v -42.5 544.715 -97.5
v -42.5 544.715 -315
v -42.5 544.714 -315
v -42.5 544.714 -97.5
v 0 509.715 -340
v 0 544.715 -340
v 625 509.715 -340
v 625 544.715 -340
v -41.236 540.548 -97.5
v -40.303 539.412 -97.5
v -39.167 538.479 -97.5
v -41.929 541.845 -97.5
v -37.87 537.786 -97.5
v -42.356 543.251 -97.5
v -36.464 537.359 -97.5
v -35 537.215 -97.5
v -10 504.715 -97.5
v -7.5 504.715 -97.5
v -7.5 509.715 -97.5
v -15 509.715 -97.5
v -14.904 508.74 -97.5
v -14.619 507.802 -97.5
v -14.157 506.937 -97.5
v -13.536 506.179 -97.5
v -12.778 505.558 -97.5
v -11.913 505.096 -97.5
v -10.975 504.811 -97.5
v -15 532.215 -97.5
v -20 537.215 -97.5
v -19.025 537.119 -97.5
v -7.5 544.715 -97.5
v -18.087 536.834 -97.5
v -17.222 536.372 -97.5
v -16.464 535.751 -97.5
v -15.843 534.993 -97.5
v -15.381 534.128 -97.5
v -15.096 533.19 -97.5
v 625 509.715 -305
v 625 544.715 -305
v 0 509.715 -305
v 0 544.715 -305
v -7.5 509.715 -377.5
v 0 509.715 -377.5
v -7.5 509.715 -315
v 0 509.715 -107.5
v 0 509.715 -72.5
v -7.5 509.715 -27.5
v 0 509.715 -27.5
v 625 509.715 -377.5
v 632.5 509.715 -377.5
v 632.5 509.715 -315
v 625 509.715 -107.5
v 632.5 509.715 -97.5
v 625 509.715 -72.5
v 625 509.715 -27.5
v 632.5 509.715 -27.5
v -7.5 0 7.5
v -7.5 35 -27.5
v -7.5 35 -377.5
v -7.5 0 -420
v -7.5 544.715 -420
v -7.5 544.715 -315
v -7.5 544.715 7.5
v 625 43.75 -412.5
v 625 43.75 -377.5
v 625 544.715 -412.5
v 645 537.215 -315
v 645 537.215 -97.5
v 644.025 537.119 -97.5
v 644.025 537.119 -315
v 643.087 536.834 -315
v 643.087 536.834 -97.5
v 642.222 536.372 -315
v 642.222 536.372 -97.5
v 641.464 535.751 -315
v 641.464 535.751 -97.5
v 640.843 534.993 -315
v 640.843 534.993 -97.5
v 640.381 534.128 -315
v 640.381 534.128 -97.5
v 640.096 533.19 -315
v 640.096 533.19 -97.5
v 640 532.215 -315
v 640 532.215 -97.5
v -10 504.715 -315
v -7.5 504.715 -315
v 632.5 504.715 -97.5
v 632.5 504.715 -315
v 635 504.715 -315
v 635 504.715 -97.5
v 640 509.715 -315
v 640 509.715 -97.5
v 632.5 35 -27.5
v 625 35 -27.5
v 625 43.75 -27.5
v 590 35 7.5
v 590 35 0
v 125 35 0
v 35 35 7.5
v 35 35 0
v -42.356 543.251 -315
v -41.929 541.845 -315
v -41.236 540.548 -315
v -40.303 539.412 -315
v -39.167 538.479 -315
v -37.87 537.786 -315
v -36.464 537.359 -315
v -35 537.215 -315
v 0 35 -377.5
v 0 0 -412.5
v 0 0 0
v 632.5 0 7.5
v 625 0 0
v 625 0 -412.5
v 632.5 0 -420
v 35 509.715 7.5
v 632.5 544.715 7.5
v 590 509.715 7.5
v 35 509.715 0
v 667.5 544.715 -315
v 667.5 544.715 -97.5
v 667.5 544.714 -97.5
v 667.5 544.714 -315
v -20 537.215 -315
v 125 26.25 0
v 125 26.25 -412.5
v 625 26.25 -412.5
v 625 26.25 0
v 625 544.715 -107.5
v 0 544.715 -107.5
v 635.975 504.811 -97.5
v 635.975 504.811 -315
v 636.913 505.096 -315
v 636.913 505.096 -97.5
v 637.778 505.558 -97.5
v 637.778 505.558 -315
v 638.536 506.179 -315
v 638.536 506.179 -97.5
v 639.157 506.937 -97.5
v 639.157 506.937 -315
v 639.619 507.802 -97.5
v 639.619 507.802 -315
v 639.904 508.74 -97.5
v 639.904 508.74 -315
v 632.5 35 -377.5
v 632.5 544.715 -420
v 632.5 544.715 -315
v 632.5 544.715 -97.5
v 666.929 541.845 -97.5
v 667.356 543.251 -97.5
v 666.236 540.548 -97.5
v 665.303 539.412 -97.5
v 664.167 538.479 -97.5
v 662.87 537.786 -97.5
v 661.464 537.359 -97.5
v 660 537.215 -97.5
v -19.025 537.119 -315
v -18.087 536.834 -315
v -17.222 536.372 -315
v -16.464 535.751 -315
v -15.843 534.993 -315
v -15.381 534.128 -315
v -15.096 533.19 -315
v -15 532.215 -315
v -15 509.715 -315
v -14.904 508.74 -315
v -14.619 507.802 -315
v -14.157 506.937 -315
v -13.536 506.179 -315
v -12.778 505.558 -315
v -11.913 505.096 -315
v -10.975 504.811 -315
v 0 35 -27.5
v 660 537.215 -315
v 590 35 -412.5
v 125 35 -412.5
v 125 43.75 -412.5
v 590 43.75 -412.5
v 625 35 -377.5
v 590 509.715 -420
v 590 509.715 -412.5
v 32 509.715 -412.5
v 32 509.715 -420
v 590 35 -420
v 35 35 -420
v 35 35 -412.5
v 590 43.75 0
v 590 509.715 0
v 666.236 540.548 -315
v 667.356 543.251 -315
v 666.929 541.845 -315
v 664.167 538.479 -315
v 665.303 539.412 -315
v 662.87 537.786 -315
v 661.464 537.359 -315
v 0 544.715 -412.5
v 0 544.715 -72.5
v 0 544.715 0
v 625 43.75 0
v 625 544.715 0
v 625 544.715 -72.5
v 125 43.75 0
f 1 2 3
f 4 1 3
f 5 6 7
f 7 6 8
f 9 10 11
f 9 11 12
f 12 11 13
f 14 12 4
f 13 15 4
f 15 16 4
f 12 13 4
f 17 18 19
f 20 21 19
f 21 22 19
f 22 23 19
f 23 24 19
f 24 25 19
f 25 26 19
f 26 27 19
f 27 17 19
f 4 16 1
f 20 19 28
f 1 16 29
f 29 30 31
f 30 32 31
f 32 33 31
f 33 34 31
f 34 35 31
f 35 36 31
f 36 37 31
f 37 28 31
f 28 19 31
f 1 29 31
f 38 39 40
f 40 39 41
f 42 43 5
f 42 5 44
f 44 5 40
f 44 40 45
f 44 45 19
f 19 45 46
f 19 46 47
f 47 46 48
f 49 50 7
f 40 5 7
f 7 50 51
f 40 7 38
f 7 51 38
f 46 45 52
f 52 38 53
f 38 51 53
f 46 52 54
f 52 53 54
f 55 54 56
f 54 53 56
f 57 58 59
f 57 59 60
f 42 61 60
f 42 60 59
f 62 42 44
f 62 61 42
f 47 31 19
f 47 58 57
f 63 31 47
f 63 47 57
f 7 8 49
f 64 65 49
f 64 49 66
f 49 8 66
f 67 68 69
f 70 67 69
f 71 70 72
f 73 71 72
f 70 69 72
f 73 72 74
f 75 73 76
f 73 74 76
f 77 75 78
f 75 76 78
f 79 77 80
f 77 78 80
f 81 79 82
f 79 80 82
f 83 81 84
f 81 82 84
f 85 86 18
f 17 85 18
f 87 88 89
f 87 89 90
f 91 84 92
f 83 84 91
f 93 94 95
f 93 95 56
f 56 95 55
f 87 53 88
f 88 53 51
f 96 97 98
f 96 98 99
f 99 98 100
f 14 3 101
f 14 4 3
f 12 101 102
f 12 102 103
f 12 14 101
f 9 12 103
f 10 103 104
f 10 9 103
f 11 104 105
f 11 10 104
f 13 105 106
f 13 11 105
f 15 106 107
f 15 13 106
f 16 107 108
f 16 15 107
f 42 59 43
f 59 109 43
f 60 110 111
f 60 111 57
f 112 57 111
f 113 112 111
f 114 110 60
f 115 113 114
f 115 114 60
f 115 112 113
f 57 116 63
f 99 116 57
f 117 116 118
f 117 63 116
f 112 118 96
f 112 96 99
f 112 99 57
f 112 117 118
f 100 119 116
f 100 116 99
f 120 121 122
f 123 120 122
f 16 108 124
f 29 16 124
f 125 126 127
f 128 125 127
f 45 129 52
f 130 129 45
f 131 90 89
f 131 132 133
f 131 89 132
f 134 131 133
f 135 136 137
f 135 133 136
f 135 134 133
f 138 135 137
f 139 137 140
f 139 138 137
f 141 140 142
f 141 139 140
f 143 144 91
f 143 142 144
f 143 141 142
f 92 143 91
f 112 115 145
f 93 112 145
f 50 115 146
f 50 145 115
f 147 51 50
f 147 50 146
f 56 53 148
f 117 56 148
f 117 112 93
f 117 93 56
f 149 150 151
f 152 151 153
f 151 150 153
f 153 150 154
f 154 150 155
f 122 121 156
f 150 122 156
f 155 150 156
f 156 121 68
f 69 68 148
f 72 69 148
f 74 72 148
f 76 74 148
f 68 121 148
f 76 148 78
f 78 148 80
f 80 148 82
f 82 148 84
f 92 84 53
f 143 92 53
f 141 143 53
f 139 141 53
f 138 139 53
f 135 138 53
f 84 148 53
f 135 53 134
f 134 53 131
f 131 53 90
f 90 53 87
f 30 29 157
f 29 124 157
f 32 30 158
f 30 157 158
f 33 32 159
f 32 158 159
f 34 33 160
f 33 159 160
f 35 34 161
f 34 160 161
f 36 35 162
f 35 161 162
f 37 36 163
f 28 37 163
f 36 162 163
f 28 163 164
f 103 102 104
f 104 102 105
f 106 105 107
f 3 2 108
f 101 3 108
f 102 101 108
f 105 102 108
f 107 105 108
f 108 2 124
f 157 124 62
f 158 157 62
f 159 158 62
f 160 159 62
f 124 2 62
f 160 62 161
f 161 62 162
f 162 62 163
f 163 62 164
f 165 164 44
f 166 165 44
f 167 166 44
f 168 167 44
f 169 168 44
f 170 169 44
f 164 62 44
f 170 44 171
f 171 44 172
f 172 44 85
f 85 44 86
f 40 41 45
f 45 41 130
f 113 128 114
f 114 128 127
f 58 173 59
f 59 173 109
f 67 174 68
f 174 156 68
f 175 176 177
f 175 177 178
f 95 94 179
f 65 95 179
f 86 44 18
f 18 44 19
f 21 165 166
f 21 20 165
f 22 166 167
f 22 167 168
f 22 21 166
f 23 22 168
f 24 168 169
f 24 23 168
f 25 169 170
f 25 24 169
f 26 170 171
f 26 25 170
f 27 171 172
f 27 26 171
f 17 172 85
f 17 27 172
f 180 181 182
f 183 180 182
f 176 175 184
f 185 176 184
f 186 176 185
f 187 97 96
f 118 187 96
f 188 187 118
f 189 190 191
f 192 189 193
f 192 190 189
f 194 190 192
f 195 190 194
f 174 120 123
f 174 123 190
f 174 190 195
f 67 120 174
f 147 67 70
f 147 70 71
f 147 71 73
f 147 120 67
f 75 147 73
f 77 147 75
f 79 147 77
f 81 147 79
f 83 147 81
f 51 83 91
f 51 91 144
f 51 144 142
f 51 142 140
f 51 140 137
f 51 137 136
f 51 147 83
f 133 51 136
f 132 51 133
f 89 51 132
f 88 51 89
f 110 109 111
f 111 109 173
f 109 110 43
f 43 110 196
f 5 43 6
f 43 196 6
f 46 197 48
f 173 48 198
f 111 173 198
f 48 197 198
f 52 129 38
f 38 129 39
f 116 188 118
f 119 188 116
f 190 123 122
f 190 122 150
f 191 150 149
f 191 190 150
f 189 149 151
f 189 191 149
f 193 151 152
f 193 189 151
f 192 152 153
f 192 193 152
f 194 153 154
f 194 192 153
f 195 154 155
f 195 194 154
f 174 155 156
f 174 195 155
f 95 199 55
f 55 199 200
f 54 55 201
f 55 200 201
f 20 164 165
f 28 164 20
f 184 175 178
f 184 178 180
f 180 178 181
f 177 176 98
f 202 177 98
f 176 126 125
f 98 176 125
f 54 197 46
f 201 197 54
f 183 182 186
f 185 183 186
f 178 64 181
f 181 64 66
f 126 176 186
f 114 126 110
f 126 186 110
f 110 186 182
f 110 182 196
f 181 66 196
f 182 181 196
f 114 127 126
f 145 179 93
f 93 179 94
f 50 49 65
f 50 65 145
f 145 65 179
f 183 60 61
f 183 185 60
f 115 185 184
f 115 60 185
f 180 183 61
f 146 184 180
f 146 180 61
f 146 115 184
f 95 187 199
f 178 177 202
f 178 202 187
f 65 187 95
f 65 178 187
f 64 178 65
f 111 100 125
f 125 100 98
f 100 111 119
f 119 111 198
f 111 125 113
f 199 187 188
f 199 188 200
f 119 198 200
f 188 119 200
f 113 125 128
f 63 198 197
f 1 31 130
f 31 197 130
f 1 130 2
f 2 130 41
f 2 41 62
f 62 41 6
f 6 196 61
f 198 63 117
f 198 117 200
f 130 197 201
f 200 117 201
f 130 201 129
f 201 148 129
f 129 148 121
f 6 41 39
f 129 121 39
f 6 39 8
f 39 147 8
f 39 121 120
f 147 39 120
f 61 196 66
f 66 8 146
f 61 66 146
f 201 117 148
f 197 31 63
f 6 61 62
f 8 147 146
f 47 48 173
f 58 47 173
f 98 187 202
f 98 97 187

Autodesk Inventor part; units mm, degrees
ref_plane "YZ Plane" through (0, 0, 0) normal (1, 0, 0) x (0, 1, 0)
ref_plane "XZ Plane" through (0, 0, 0) normal (0, 1, 0) x (-1, 0, 0)
ref_plane "XY Plane" through (0, 0, 0) normal (0, 0, 1) x (1, 0, 0)
sketch "Boceto1" plane through (0, 0, 0) normal (0, 0, 1) x (1, 0, 0)
  line L0 (0, 0) -> (0, 544.715)
  line L1 (0, 544.715) -> (35, 544.715)
  line L2 (35, 509.715) -> (35, 0)
  line L3 (35, 0) -> (0, 0)
  line L4 (35, 544.715) -> (625, 544.715)
  line L5 (625, 544.715) -> (625, 509.715)
  line L6 (625, 509.715) -> (35, 509.715)
  line L7 (625, 509.715) -> (625, 0)
  line L8 (590, 0) -> (590, 509.715)
  line L9 (590, 0) -> (625, 0)
  line L10 (590, 0) -> (625, 0)
  line L11 (590, 509.715) -> (590, 0)
  line L12 (35, 0) -> (590, 0)
  line L13 (590, 0) -> (590, 35)
  line L14 (590, 35) -> (35, 35)
  line L15 (35, 544.715) -> (35, 509.715)
  line L16 (590, 509.715) -> (590, 544.715)
  dimension "d0" = 544.715
  dimension "d1" = 35
  dimension "d2" = 590
  dimension "d3" = 35
  dimension "d4" = 35
  dimension "d5" = 35
extrude "Extrusión1" add sketch "Boceto1" along normal blind 7.5 contours L0 L1 L15 L2 L3 | L2 L14 L8 L12 | L4 L16 L6 L15 | L8 L6 L7 L9 | L4 L5 L6 L16
ref_plane "Plano de trabajo1" through (0, 0, -617.5) normal (0, 0, -1) x (-1, 0, 0)
sketch "Boceto6" plane through (625, 0, 0) normal (1, 0, 0) x (0, 0, -1)
  line L0 (0, 0) -> (-7.5, 0) projected
  line L1 (-7.5, 0) -> (412.5, 0)
  line L2 (412.5, 0) -> (412.5, 544.715)
  line L3 (-7.5, 544.715) -> (-7.5, 0) projected
  line L4 (412.5, 544.715) -> (-7.5, 544.715)
  line L5 (-7.5, 544.715) -> (-7.5, 0)
  line L6 (-7.5, 544.715) -> (-7.5, 509.715)
  line L7 (-7.5, 509.715) -> (377.5, 509.715)
  line L8 (377.5, 509.715) -> (377.5, 35)
  line L9 (377.5, 35) -> (27.5, 35)
  line L10 (27.5, 35) -> (27.5, 509.715)
  dimension "d28" = 420
  dimension "d29" = 544.715
  dimension "d30" = 35
  dimension "d31" = 385
  dimension "d32" = 474.715
  dimension "d33" = 350
extrude "Extrusión5" add sketch "Boceto6" along normal blind 7.5
sketch "Boceto7" plane through (625, 0, -412.5) normal (0, 0, -1) x (-1, 0, 0)
  line L0 (625, 544.715) -> (-7.5, 544.715) projected
  line L1 (-7.5, 544.715) -> (625, 544.715)
  line L2 (625, 544.715) -> (625, 0)
  line L3 (625, 0) -> (-7.5, 0) projected
  line L4 (625, 0) -> (-7.5, 0)
  line L5 (-7.5, 0) -> (-7.5, 544.715) projected
  line L6 (-7.5, 544.715) -> (-7.5, 0)
  line L7 (-7.5, 544.715) -> (-7.5, 509.715)
  line L8 (35, 509.715) -> (593, 509.715)
  line L9 (35, 35) -> (590, 35) projected
  line L10 (593, 509.715) -> (590, 35)
  line L11 (590, 35) -> (35, 35)
  line L12 (35, 35) -> (35, 509.715)
  dimension "d36" = 35
  dimension "d37" = 600.5
extrude "Extrusión6" add sketch "Boceto7" along normal blind 7.5
sketch "Boceto8" plane through (0, 0, -412.5) normal (-1, 0, 0) x (0, 0, 1)
  line L0 (420, 544.715) -> (-7.5, 544.715) projected
  line L1 (-7.5, 544.715) -> (420, 544.715)
  line L2 (420, 544.715) -> (420, 0) projected
  line L3 (420, 544.715) -> (420, 0)
  line L4 (420, 0) -> (-7.5, 0)
  line L5 (412.5, 0) -> (0, 0) projected
  line L6 (-7.5, 0) -> (-7.5, 544.715)
  line L7 (-7.5, 35) -> (-7.5, 509.715) projected
  line L8 (-7.5, 544.715) -> (-7.5, 509.715)
  line L9 (385, 509.715) -> (385, 35) projected
  line L10 (35, 509.715) -> (385, 509.715)
  line L11 (385, 509.715) -> (385, 35)
  line L12 (35, 35) -> (35, 509.715) projected
  line L13 (385, 35) -> (35, 35)
  line L14 (35, 35) -> (35, 509.715)
  point P0 (144.8076, 0)
  point P1 (0, 415.0504)
  dimension "d40" = 35
extrude "Extrusión7" add sketch "Boceto8" along normal blind 7.5
sketch "Boceto9" plane through (632.5, 544.715, 7.5) normal (0, 1, 0) x (1, 0, 0)
  line L0 (-640, 0) -> (0, 0) projected
  line L1 (-640, 0) -> (-640, 80)
  line L2 (-640, 0) -> (-640, 427.5) projected
  line L3 (-640, 80) -> (0, 80)
  line L4 (0, 80) -> (0, 115)
  line L5 (0, 115) -> (-640, 115)
  line L6 (-640, 115) -> (-640, 80)
  line L7 (0, 427.5) -> (-640, 427.5) projected
  line L8 (-640, 427.5) -> (-640, 347.5)
  line L9 (-640, 347.5) -> (0, 347.5)
  line L10 (0, 347.5) -> (0, 312.5)
  line L11 (0, 35) -> (0, 385) projected
  line L12 (0, 312.5) -> (-640, 312.5)
  line L13 (-640, 312.5) -> (-640, 347.5)
  point P0 (-632.5, 7.5)
  dimension "d43" = 80
  dimension "d44" = 640
  dimension "d45" = 35
  dimension "d46" = 640
  dimension "d47" = 80
  dimension "d48" = 640
  dimension "d49" = 35
  dimension "d50" = 640
extrude "Extrusión8" add sketch "Boceto9" against normal blind 35 contours L2 L5 L4 L3 | L2 L9 L10 L12
sketch "Boceto10" plane through (632.5, 0, 0) normal (1, 0, 0) x (0, 0, -1)
  line L0 (-7.5, 544.715) -> (-7.5, 0) projected
  line L1 (412.5, 544.715) -> (-7.5, 544.715) projected
  line L2 (-7.5, 544.715) -> (107.5, 544.715)
  line L3 (107.5, 544.715) -> (97.5, 544.715)
  line L4 (-7.5, 544.715) -> (420, 544.715) projected
  line L5 (97.5, 544.715) -> (97.5, 504.715)
  line L6 (420, 544.715) -> (420, 0) projected
  line L7 (420, 544.715) -> (315, 544.715)
  line L8 (315, 544.715) -> (315, 504.715)
  line L9 (315, 504.715) -> (97.5, 504.715)
  line L10 (97.5, 544.715) -> (315, 544.715)
  point P0 (0, 0)
  point P1 (305, 544.715)
  dimension "d53" = 115
  dimension "d54" = 10
  dimension "d55" = 40
  dimension "d56" = 105
extrude "Extrusión9" add sketch "Boceto10" along normal blind 7.5
sketch "Boceto11" plane through (632.5, 504.715, -97.5) normal (0, 0, 1) x (1, 0, 0)
  line L0 (0, 40) -> (7.5, 40) projected
  line L1 (7.5, 40) -> (7.5, 32.5)
  line L2 (7.5, 40) -> (7.5, 0) projected
  line L3 (7.5, 0) -> (7.5, 40)
  line L4 (0, 40) -> (35, 40)
  line L5 (35, 40) -> (35, 32.5)
  line L6 (35, 32.5) -> (7.5, 32.5)
  line L7 (7.5, 32.5) -> (0, 32.5)
  line L8 (0, 5) -> (0, 40) projected
  line L9 (0, 32.5) -> (0, 40)
  point P0 (-632.5, -504.715)
  dimension "d59" = 7.5
  dimension "d64" = 35
extrude "Extrusión10" add sketch "Boceto11" against normal blind 217.5
fillet "Empalme1" radius 7.5 1 edges at (667.5, 537.215, -206.25)
fillet "Empalme2" radius 5 1 edges at (640, 537.215, -206.25)
fillet "Empalme3" radius 5 1 edges at (640, 504.715, -206.25)
sketch "Boceto14" plane through (-7.5, 0, -412.5) normal (-1, 0, 0) x (0, 0, 1)
  line L0 (-7.5, 544.715) -> (-7.5, 0) projected
  line L1 (97.5, 544.715) -> (-7.5, 544.715) projected
  line L2 (-7.5, 544.715) -> (97.5, 544.715)
  line L3 (97.5, 544.715) -> (97.5, 504.715)
  line L4 (97.5, 504.715) -> (315, 504.715)
  line L5 (315, 504.715) -> (315, 544.715)
  line L6 (315, 544.715) -> (97.5, 544.715)
  point P0 (412.5, 0)
  point P1 (0, 544.715)
  dimension "d76" = 105
  dimension "d77" = 40
  dimension "d78" = 217.5
extrude "Extrusión11" add sketch "Boceto14" along normal blind 7.5
sketch "Boceto15" plane through (-7.5, 504.715, -315) normal (0, 0, -1) x (-1, 0, 0)
  line L0 (0, 40) -> (0, 5) projected
  line L1 (0, 40) -> (35, 40)
  line L2 (35, 40) -> (35, 32.5)
  line L3 (35, 32.5) -> (0, 32.5)
  point P0 (-7.5, -504.715)
  dimension "d81" = 35
  dimension "d82" = 7.5
extrude "Extrusión12" add sketch "Boceto15" against normal blind 217.5
fillet "Empalme4" radius 7.5 1 edges at (-42.5, 537.215, -206.25)
fillet "Empalme5" radius 5 1 edges at (-15, 537.215, -206.25)
fillet "Empalme6" radius 5 1 edges at (-15, 504.715, -206.25)
sketch "Boceto18" plane through (35, 35, -412.5) normal (0, 1, 0) x (1, 0, 0)
  line L0 (-35, 0) -> (590, 0) projected
  line L1 (590, 0) -> (550, 0)
  line L2 (550, 0) -> (490, 0)
  line L3 (490, 0) -> (90, 0)
  line L4 (90, 0) -> (90, -412.5)
  line L5 (590, -412.5) -> (-35, -412.5) projected
  line L6 (90, -412.5) -> (590, -412.5)
  line L7 (590, -412.5) -> (590, 0) projected
  line L8 (590, -412.5) -> (590, 0)
  line L9 (590, 0) -> (90, 0)
  point P0 (590, -144.8076)
  dimension "d90" = 40
  dimension "d91" = 60
  dimension "d92" = 400
extrude "Extrusión13" add sketch "Boceto18" along normal mid plane 17.5
properties part number "mesa" material "Hierro, fundido"
